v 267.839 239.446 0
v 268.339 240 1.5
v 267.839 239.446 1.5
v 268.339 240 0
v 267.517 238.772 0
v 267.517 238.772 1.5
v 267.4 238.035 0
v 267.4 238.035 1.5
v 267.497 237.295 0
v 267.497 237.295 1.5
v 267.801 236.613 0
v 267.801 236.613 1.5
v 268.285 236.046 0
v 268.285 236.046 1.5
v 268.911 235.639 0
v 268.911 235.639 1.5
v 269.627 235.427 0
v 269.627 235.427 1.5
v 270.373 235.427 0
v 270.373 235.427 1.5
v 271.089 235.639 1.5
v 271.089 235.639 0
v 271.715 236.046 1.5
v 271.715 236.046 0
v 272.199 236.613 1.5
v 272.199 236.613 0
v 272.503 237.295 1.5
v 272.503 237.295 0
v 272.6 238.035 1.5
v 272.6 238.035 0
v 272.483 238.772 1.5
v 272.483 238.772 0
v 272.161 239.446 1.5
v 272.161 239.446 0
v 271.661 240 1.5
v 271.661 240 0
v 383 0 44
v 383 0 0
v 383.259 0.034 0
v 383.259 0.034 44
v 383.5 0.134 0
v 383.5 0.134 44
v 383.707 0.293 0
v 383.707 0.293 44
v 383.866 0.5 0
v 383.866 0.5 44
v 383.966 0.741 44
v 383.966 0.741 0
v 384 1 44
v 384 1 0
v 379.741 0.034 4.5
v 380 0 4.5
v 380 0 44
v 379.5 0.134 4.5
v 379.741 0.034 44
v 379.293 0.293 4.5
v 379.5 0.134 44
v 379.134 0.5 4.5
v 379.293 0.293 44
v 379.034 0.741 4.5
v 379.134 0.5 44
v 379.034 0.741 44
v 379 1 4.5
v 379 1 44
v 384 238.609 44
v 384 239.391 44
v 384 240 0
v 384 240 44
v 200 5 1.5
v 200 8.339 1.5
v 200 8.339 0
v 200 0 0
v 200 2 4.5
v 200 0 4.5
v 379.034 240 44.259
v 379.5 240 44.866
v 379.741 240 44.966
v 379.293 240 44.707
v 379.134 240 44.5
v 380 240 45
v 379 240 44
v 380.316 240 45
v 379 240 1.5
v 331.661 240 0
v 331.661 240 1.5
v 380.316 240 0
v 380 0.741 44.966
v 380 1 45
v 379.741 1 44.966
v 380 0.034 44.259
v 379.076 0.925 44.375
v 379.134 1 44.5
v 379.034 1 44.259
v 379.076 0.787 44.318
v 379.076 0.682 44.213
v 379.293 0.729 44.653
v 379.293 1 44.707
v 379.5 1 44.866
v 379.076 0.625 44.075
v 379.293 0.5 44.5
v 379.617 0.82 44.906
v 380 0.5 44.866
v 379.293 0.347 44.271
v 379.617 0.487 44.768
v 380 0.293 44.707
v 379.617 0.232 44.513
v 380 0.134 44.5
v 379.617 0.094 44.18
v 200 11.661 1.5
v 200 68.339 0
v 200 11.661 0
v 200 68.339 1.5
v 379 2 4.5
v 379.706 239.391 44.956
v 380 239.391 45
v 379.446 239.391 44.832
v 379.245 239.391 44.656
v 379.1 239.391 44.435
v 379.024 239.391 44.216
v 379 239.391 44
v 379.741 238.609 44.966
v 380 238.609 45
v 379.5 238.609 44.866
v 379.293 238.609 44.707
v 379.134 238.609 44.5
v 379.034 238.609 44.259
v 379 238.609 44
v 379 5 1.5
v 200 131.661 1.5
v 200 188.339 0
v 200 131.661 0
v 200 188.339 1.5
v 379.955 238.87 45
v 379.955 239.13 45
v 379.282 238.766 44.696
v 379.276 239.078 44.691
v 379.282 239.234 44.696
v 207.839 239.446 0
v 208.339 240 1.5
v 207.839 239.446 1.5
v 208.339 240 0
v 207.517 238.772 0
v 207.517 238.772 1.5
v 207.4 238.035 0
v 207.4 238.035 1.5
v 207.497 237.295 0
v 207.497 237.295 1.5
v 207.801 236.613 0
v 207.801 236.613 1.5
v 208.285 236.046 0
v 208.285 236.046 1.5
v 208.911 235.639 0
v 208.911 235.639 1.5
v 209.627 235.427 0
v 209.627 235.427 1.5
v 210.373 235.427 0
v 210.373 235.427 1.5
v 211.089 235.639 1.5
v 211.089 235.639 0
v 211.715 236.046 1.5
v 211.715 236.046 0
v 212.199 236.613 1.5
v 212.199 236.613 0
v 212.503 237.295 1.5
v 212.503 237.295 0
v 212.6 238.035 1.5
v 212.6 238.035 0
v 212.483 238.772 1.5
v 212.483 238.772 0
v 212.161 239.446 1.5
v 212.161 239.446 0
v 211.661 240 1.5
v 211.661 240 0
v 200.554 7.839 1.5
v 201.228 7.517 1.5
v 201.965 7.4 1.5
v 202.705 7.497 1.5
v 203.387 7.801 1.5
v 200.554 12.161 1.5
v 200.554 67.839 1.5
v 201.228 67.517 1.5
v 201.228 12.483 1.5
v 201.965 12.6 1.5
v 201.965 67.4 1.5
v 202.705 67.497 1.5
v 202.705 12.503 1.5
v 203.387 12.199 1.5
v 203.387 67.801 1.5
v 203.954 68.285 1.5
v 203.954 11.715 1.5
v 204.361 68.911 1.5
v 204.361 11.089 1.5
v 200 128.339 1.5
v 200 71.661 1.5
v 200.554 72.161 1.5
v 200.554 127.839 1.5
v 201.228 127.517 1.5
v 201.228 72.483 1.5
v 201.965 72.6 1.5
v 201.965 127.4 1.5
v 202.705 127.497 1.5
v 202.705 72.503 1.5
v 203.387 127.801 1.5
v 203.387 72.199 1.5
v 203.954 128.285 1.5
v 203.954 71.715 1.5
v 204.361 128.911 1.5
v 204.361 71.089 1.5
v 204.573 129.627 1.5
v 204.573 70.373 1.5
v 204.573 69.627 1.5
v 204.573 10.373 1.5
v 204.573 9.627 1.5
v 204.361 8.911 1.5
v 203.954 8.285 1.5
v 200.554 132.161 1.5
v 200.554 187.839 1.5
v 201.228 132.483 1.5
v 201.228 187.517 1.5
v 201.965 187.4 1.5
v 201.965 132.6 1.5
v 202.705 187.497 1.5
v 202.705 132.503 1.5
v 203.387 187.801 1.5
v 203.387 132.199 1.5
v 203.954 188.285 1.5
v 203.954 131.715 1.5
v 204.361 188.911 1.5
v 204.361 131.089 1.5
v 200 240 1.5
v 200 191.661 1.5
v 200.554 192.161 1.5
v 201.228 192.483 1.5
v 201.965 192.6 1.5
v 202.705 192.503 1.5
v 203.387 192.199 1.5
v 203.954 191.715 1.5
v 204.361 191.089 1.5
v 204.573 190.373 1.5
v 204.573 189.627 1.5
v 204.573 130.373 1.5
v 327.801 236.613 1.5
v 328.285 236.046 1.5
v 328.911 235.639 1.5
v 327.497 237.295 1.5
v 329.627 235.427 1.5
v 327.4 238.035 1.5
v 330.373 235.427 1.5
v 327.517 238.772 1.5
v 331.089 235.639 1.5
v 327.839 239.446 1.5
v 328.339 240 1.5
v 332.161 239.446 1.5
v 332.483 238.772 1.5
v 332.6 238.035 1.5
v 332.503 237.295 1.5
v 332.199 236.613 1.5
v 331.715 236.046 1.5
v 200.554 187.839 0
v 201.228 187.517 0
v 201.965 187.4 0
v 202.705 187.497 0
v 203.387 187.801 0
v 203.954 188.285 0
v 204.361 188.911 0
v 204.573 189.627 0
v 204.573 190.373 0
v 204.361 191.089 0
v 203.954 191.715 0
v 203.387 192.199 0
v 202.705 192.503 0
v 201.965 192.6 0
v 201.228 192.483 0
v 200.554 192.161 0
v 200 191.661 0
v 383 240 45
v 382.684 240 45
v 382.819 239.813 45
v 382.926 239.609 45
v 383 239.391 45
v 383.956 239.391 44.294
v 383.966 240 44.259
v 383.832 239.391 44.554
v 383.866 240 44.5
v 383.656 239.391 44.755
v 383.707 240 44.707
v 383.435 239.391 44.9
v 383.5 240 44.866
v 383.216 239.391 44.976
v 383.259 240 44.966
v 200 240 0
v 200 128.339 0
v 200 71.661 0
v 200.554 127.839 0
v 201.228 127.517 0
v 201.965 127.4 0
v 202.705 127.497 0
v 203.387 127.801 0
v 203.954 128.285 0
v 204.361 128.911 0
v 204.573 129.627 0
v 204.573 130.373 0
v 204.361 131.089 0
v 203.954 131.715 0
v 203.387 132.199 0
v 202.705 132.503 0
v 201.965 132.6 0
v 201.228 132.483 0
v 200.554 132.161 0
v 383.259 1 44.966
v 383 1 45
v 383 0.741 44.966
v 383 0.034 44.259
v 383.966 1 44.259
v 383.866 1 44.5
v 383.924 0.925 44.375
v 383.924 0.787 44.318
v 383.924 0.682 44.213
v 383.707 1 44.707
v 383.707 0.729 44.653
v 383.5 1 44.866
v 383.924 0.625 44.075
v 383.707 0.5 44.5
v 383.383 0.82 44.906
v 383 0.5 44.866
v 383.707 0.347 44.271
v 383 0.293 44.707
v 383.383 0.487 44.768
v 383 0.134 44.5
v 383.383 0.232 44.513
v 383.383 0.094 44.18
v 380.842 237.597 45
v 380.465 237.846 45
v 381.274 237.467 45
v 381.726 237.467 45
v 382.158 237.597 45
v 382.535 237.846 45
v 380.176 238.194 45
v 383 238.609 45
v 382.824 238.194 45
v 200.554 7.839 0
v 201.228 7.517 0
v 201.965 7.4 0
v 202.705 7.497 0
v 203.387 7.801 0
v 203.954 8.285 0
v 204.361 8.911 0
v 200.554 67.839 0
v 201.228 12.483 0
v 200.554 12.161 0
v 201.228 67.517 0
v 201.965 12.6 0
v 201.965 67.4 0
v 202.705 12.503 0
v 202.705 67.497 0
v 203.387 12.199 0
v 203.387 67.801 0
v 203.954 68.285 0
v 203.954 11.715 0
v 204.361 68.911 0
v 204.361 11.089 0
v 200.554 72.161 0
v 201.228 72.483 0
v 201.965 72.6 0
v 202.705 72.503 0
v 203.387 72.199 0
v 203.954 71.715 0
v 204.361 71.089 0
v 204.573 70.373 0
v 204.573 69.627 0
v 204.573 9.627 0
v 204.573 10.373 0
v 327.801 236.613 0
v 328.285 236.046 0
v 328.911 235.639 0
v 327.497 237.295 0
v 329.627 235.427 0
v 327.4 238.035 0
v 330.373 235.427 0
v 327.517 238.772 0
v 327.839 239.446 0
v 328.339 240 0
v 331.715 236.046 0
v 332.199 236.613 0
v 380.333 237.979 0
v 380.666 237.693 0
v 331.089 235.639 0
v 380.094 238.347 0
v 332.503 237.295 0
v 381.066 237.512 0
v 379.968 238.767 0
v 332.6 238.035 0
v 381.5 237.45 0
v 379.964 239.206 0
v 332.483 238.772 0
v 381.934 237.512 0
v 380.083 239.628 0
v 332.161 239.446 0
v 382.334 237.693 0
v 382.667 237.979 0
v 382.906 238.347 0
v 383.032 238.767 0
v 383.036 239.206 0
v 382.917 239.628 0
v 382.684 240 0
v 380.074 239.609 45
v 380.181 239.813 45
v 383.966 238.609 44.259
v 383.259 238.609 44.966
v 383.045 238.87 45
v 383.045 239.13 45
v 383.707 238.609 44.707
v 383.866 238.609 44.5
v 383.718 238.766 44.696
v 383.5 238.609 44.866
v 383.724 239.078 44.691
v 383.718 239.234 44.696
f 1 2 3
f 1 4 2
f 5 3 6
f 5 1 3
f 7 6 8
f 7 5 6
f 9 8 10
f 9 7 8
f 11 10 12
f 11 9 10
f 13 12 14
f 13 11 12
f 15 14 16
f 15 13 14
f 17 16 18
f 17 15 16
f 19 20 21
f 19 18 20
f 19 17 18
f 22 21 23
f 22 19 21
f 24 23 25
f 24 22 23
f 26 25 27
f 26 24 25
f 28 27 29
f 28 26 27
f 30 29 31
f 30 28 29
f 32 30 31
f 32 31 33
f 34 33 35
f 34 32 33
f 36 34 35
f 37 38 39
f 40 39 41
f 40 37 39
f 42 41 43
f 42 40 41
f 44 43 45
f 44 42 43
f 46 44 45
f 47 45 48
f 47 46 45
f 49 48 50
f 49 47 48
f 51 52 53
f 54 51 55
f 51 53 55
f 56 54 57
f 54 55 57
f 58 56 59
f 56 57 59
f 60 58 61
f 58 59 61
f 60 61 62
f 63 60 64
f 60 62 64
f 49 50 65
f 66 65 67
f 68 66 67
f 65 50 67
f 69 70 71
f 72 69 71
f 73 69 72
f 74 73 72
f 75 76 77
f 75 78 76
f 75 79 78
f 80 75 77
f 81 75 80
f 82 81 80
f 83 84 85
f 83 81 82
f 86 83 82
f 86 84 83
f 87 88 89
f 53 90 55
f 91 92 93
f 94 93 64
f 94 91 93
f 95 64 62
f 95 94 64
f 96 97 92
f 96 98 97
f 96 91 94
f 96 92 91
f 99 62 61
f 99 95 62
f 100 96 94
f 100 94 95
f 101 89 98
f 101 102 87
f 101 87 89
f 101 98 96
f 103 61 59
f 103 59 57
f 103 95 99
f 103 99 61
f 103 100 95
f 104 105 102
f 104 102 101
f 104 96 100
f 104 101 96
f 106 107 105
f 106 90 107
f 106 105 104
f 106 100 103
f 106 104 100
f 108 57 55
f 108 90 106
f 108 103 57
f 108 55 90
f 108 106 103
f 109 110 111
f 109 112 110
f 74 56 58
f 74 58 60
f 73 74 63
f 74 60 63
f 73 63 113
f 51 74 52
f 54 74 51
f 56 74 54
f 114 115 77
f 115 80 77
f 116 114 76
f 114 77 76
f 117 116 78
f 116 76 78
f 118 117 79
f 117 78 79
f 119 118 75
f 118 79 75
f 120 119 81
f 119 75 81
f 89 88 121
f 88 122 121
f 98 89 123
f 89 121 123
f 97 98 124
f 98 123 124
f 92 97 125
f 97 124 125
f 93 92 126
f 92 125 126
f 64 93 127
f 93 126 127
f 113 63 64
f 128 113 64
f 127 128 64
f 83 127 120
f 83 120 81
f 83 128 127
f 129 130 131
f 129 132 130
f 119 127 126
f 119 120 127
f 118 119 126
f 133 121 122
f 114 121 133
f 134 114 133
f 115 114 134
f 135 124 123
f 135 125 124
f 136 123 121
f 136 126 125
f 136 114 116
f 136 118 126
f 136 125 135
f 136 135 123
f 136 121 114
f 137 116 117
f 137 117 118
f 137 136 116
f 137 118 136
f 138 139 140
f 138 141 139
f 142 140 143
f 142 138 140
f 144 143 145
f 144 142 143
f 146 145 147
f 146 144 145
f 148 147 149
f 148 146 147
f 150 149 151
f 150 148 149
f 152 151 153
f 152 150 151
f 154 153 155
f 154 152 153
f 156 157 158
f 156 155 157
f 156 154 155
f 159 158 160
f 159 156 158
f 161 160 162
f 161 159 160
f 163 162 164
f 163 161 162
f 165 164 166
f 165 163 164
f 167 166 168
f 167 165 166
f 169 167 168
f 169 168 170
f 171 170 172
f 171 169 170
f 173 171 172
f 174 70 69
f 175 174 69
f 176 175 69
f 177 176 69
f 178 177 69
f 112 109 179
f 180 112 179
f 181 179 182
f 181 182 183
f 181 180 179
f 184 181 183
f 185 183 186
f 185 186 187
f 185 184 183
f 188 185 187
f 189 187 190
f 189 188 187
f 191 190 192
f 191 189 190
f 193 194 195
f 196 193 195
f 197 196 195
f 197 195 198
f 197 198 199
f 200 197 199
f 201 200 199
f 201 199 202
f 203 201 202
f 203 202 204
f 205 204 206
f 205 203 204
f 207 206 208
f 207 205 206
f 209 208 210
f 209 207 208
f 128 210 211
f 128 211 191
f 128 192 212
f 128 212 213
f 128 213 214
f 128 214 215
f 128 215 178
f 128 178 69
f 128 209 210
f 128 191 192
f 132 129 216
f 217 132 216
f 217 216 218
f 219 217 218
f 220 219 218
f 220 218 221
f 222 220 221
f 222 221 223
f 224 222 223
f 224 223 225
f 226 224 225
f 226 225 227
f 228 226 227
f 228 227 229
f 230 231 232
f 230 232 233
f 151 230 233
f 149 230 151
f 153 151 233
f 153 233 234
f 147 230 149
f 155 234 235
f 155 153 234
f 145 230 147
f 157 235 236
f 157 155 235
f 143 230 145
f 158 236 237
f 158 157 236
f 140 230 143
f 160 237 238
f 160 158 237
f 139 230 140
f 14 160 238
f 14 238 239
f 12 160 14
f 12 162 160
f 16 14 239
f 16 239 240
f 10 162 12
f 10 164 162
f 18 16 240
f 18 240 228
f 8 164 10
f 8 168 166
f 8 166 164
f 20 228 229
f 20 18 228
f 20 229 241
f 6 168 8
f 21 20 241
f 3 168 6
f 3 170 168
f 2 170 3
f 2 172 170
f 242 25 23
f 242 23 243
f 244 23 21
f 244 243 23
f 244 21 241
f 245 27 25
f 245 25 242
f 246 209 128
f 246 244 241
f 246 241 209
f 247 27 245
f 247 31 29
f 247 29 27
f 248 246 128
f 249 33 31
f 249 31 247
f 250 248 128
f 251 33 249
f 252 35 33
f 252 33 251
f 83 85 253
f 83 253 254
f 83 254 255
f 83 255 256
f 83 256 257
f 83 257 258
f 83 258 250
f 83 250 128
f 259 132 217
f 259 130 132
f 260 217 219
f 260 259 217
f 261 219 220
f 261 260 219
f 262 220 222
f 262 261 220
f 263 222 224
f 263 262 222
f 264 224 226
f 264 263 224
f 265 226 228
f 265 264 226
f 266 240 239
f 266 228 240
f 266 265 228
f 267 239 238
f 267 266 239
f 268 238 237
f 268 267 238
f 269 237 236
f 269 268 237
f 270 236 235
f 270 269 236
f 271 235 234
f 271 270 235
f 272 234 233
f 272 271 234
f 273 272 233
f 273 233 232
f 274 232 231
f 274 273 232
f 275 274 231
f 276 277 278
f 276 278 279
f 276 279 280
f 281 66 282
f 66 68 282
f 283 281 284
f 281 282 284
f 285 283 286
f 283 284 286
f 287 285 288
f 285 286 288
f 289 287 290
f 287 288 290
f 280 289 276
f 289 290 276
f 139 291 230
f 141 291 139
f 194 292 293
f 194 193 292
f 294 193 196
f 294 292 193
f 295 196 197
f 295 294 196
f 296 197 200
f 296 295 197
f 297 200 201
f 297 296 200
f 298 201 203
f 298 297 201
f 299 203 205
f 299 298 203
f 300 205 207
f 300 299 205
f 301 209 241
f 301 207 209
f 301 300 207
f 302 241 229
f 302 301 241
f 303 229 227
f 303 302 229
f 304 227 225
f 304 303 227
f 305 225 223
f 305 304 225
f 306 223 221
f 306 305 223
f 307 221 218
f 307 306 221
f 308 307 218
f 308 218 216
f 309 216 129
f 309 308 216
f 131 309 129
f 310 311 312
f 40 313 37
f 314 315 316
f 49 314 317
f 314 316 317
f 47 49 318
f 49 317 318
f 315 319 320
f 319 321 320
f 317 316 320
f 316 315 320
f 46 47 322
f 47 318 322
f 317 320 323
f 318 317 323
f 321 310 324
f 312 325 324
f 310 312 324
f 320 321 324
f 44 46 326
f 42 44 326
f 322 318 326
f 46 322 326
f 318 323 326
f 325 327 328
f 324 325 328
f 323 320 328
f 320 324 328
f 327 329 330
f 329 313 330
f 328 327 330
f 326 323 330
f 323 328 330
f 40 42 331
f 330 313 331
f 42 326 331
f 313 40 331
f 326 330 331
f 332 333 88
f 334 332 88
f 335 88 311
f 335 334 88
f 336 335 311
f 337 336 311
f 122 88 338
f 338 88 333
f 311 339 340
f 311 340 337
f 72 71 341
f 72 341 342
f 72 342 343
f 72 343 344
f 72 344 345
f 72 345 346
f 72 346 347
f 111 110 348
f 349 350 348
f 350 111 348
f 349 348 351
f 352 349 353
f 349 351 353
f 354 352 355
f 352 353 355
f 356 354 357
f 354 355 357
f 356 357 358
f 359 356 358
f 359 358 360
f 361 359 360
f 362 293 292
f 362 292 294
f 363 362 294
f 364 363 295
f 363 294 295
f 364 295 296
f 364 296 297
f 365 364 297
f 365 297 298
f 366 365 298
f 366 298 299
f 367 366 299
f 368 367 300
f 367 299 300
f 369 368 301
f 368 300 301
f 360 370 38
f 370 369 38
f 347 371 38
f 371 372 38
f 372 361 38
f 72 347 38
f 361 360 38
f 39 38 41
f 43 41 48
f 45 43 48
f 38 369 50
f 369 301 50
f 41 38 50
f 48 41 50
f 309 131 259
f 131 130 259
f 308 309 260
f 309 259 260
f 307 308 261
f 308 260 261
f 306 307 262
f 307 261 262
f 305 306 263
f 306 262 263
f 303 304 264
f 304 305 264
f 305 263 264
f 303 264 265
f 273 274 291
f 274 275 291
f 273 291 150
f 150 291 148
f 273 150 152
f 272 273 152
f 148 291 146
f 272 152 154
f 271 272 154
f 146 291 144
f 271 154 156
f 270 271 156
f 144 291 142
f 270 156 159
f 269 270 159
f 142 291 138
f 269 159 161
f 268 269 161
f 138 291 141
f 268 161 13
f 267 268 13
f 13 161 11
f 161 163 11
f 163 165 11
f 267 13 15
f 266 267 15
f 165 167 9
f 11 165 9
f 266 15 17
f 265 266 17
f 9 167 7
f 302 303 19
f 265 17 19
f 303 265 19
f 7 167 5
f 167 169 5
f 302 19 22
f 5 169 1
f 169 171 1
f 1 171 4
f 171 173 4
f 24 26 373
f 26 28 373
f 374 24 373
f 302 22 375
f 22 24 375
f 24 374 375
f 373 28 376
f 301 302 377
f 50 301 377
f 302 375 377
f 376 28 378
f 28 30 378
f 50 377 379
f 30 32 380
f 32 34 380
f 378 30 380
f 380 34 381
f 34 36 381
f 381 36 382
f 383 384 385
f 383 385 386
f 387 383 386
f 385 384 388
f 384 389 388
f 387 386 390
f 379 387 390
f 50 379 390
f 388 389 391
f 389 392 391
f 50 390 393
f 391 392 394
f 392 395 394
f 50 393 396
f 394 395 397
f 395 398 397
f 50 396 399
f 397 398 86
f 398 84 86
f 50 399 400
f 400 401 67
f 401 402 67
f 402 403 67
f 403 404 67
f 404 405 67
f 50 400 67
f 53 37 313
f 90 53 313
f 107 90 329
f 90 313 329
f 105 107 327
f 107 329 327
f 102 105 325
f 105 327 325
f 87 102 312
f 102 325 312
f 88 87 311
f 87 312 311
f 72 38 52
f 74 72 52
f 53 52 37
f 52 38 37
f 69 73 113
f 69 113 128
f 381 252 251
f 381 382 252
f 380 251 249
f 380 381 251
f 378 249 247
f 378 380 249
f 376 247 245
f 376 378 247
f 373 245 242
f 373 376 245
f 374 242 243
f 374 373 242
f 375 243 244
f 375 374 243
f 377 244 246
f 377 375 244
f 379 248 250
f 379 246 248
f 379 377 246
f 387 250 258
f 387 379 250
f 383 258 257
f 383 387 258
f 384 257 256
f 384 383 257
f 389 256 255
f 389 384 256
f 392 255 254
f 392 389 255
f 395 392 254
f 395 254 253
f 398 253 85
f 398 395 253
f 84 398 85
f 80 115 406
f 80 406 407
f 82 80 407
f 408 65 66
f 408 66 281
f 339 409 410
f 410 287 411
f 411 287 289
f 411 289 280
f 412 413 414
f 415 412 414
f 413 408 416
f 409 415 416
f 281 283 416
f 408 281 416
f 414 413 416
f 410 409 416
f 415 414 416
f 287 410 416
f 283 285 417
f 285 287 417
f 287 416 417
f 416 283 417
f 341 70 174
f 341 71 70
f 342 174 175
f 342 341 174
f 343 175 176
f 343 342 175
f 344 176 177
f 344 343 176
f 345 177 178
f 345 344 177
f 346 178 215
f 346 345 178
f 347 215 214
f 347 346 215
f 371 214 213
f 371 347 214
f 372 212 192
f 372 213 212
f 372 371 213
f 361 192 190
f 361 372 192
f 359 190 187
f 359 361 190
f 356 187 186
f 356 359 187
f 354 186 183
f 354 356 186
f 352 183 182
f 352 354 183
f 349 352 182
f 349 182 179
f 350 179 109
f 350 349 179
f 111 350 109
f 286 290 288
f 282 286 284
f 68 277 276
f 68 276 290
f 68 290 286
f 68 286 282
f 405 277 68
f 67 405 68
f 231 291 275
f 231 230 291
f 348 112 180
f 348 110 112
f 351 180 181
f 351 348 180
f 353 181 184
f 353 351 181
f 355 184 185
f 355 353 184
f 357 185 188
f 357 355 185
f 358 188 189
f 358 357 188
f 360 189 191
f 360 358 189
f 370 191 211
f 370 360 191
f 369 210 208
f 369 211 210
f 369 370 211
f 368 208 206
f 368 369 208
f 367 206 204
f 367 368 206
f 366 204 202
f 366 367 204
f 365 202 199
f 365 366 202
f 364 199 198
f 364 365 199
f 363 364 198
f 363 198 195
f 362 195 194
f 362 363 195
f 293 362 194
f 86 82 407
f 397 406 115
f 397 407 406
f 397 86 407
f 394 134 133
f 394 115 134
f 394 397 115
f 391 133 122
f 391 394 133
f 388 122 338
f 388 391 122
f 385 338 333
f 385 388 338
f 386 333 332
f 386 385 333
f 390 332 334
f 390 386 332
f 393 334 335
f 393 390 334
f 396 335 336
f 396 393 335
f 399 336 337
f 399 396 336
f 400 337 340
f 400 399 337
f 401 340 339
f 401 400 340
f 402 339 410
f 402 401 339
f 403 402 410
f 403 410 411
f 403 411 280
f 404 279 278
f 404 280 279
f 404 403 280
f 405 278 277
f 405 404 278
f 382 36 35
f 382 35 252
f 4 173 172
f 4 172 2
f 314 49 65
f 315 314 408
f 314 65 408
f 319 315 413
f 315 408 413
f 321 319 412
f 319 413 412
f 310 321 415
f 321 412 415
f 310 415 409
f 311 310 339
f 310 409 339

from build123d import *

# Parameters (mm, degrees)
SKETCH007_W            = 184
SKETCH007_H            = 240
PAD006_DEPTH           = 1.5
SKETCH009_W            = 5
SKETCH009_H            = 240
PAD007_DEPTH           = 43.5
PAD008_DEPTH           = 179
SKETCH008_R            = 2.6
POCKET_DEPTH           = 45.001
LINEARPATTERN002_COUNT = 4
LINEARPATTERN002_PITCH = 60
SKETCH011_R            = 2.6
POCKET001_DEPTH        = 45.001
LINEARPATTERN003_COUNT = 3
LINEARPATTERN003_PITCH = 60
SKETCH012_R            = 1.55
POCKET002_DEPTH        = 45.001
FILLET003_R            = 1


with BuildPart() as part:
    # Sketch007 (on XY_Plane001 of Origin002) → Pad006 (new body)
    with BuildSketch(Plane.XY):
        with Locations((292, 120)):
            Rectangle(SKETCH007_W, SKETCH007_H)
    extrude(amount=PAD006_DEPTH)

    # Sketch009 (on Face4 of Pad006) → Pad007 (join)
    with BuildSketch(Plane.XY.offset(1.5)):
        with Locations((381.5, 120)):
            Rectangle(SKETCH009_W, SKETCH009_H)
    extrude(amount=PAD007_DEPTH)

    # Sketch010 (on Face4 of Pad007) → Pad008 (join)
    with BuildSketch(Plane(origin=(379, 0, 0), x_dir=(0, -1, 0), z_dir=(-1, 0, 0))):
        Polygon((0, 1.5), (0, 4.5), (-2, 4.5), (-5, 1.5), align=None)
    extrude(amount=PAD008_DEPTH)

    # Sketch008 (on XY_Plane001 of Origin002) → Pocket (cut, through all)
    with BuildSketch(Plane.XY):
        with Locations((202, 10)):
            Circle(SKETCH008_R)
    pocket = extrude(amount=POCKET_DEPTH, mode=Mode.SUBTRACT)

    # LinearPattern002: Pocket ×4
    with Locations(*[(0, i * LINEARPATTERN002_PITCH, 0) for i in range(1, LINEARPATTERN002_COUNT)]):
        add(pocket, mode=Mode.SUBTRACT)

    # Sketch011 (on XY_Plane001 of Origin002) → Pocket001 (cut, through all)
    with BuildSketch(Plane.XY):
        with Locations((210, 238)):
            Circle(SKETCH011_R)
    pocket001 = extrude(amount=POCKET001_DEPTH, mode=Mode.SUBTRACT)

    # LinearPattern003: Pocket001 ×3
    with Locations(*[(i * LINEARPATTERN003_PITCH, 0, 0) for i in range(1, LINEARPATTERN003_COUNT)]):
        add(pocket001, mode=Mode.SUBTRACT)

    # Sketch012 (on XY_Plane001 of Origin002) → Pocket002 (cut, through all)
    with BuildSketch(Plane.XY):
        with Locations((381.5, 239)):
            Circle(SKETCH012_R)
    extrude(amount=POCKET002_DEPTH, mode=Mode.SUBTRACT)

    # Fillet003
    fillet003_edges = [part.edges().sort_by_distance(p)[0] for p in [
        (381.5, 0, 45),
        (379, 120, 45),
        (384, 120, 45),
        (384, 0, 22.5),
        (379, 0, 24.75),
    ]]
    fillet(fillet003_edges, radius=FILLET003_R)


solid = part.part
